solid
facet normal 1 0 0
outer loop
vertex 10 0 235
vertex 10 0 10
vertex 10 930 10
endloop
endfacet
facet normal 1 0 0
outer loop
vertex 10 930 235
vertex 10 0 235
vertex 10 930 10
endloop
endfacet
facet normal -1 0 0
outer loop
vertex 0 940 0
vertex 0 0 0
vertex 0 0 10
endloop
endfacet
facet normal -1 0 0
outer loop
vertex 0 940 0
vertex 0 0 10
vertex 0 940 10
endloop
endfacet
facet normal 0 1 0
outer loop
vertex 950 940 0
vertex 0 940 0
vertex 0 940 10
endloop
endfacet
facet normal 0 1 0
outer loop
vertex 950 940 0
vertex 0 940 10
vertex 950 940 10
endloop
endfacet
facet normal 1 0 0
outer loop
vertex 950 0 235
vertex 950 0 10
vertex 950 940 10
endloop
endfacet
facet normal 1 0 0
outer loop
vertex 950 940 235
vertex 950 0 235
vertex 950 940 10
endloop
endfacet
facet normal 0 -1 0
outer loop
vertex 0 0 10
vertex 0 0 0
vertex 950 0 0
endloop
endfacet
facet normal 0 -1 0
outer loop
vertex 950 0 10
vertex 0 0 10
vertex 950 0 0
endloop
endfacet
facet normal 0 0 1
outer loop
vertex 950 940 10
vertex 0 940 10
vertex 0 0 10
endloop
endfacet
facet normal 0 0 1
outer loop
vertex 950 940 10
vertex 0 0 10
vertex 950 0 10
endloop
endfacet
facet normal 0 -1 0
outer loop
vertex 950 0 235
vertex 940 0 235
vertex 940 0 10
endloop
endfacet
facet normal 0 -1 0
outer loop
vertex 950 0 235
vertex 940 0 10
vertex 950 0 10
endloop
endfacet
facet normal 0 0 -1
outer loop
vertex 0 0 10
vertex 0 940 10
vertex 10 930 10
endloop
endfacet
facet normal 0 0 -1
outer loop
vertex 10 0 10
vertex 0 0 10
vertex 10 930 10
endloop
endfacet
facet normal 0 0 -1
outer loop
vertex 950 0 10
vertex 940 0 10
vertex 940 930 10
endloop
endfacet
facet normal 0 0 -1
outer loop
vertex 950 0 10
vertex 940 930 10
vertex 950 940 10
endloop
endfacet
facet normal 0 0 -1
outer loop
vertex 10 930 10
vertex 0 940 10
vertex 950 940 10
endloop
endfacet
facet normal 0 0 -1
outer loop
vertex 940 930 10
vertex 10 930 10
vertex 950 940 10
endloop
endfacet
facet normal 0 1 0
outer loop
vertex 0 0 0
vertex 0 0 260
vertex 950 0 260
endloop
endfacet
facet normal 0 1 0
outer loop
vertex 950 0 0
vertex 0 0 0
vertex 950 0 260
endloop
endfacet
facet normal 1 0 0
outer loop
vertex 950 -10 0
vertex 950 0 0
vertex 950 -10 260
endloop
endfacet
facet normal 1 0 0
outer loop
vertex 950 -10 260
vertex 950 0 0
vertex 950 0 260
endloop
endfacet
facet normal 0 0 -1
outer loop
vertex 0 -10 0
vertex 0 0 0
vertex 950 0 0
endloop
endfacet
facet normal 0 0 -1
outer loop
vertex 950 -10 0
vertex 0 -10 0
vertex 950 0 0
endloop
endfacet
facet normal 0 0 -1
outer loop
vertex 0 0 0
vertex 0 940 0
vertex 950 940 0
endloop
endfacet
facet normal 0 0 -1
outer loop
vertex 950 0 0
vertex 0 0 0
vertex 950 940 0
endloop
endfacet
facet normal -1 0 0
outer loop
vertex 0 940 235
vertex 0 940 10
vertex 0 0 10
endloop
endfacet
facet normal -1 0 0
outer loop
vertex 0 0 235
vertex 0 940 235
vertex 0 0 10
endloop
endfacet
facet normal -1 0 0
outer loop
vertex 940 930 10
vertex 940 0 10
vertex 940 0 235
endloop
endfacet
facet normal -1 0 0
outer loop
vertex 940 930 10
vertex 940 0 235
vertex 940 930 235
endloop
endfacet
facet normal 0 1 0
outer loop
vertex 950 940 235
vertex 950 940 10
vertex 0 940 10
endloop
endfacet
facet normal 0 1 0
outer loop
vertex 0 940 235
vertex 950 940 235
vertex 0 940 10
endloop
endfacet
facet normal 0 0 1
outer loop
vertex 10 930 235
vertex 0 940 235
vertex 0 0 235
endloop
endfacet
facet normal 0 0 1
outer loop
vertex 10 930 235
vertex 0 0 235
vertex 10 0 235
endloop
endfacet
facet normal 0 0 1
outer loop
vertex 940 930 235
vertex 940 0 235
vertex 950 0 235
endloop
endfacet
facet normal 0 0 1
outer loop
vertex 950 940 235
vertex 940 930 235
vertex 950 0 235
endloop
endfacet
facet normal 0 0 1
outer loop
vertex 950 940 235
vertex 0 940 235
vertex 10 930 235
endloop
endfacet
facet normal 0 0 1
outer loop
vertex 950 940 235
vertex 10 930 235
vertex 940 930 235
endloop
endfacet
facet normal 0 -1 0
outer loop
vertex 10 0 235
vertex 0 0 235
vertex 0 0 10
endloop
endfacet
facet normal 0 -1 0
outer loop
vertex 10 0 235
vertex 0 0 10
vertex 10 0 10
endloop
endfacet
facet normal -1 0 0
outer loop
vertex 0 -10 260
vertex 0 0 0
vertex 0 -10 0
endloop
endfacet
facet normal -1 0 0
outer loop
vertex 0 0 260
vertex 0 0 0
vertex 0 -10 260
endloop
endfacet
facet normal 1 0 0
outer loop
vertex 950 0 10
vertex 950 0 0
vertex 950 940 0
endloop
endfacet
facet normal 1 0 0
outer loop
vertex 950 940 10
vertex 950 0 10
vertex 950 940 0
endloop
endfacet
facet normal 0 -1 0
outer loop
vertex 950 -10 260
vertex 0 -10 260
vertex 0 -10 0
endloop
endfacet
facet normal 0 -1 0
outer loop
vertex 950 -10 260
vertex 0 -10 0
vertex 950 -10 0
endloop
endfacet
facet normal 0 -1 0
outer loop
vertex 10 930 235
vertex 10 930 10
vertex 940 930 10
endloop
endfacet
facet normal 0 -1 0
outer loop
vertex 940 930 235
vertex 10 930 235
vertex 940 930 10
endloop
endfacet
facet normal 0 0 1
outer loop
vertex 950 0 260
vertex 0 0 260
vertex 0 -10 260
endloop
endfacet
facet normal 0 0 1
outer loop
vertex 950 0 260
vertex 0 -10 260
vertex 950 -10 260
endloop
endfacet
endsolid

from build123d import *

# Parameters (mm, degrees)
F0_W     = 950
F0_H     = 940
F1_DEPTH = 10
F2_W     = 10
F2_H     = 930
F3_DEPTH = 225
F4_W     = 950
F4_H     = 260
F5_DEPTH = 10


with BuildPart() as f1:
    # F0 (on Top) → F1 (new body)
    with BuildSketch(Plane.XY):
        with Locations((475, 470)):
            Rectangle(F0_W, F0_H)
    extrude(amount=F1_DEPTH)


with BuildPart() as f3:
    # F2 (on face) → F3 (new body)
    with BuildSketch(Plane.XY.offset(10)):
        Polygon((950, 940), (0, 940), (0, 930), (10, 930), (940, 930), (950, 930), align=None)
        with Locations((5, 465)):
            Rectangle(F2_W, F2_H)
        with Locations((945, 465)):
            Rectangle(F2_W, F2_H)
    extrude(amount=F3_DEPTH)


with BuildPart() as f5:
    # F4 (on face) → F5 (new body)
    with BuildSketch(Plane.XZ):
        with Locations((475, 130)):
            Rectangle(F4_W, F4_H)
    extrude(amount=F5_DEPTH)


solid = Compound([f1.part, f3.part, f5.part])
